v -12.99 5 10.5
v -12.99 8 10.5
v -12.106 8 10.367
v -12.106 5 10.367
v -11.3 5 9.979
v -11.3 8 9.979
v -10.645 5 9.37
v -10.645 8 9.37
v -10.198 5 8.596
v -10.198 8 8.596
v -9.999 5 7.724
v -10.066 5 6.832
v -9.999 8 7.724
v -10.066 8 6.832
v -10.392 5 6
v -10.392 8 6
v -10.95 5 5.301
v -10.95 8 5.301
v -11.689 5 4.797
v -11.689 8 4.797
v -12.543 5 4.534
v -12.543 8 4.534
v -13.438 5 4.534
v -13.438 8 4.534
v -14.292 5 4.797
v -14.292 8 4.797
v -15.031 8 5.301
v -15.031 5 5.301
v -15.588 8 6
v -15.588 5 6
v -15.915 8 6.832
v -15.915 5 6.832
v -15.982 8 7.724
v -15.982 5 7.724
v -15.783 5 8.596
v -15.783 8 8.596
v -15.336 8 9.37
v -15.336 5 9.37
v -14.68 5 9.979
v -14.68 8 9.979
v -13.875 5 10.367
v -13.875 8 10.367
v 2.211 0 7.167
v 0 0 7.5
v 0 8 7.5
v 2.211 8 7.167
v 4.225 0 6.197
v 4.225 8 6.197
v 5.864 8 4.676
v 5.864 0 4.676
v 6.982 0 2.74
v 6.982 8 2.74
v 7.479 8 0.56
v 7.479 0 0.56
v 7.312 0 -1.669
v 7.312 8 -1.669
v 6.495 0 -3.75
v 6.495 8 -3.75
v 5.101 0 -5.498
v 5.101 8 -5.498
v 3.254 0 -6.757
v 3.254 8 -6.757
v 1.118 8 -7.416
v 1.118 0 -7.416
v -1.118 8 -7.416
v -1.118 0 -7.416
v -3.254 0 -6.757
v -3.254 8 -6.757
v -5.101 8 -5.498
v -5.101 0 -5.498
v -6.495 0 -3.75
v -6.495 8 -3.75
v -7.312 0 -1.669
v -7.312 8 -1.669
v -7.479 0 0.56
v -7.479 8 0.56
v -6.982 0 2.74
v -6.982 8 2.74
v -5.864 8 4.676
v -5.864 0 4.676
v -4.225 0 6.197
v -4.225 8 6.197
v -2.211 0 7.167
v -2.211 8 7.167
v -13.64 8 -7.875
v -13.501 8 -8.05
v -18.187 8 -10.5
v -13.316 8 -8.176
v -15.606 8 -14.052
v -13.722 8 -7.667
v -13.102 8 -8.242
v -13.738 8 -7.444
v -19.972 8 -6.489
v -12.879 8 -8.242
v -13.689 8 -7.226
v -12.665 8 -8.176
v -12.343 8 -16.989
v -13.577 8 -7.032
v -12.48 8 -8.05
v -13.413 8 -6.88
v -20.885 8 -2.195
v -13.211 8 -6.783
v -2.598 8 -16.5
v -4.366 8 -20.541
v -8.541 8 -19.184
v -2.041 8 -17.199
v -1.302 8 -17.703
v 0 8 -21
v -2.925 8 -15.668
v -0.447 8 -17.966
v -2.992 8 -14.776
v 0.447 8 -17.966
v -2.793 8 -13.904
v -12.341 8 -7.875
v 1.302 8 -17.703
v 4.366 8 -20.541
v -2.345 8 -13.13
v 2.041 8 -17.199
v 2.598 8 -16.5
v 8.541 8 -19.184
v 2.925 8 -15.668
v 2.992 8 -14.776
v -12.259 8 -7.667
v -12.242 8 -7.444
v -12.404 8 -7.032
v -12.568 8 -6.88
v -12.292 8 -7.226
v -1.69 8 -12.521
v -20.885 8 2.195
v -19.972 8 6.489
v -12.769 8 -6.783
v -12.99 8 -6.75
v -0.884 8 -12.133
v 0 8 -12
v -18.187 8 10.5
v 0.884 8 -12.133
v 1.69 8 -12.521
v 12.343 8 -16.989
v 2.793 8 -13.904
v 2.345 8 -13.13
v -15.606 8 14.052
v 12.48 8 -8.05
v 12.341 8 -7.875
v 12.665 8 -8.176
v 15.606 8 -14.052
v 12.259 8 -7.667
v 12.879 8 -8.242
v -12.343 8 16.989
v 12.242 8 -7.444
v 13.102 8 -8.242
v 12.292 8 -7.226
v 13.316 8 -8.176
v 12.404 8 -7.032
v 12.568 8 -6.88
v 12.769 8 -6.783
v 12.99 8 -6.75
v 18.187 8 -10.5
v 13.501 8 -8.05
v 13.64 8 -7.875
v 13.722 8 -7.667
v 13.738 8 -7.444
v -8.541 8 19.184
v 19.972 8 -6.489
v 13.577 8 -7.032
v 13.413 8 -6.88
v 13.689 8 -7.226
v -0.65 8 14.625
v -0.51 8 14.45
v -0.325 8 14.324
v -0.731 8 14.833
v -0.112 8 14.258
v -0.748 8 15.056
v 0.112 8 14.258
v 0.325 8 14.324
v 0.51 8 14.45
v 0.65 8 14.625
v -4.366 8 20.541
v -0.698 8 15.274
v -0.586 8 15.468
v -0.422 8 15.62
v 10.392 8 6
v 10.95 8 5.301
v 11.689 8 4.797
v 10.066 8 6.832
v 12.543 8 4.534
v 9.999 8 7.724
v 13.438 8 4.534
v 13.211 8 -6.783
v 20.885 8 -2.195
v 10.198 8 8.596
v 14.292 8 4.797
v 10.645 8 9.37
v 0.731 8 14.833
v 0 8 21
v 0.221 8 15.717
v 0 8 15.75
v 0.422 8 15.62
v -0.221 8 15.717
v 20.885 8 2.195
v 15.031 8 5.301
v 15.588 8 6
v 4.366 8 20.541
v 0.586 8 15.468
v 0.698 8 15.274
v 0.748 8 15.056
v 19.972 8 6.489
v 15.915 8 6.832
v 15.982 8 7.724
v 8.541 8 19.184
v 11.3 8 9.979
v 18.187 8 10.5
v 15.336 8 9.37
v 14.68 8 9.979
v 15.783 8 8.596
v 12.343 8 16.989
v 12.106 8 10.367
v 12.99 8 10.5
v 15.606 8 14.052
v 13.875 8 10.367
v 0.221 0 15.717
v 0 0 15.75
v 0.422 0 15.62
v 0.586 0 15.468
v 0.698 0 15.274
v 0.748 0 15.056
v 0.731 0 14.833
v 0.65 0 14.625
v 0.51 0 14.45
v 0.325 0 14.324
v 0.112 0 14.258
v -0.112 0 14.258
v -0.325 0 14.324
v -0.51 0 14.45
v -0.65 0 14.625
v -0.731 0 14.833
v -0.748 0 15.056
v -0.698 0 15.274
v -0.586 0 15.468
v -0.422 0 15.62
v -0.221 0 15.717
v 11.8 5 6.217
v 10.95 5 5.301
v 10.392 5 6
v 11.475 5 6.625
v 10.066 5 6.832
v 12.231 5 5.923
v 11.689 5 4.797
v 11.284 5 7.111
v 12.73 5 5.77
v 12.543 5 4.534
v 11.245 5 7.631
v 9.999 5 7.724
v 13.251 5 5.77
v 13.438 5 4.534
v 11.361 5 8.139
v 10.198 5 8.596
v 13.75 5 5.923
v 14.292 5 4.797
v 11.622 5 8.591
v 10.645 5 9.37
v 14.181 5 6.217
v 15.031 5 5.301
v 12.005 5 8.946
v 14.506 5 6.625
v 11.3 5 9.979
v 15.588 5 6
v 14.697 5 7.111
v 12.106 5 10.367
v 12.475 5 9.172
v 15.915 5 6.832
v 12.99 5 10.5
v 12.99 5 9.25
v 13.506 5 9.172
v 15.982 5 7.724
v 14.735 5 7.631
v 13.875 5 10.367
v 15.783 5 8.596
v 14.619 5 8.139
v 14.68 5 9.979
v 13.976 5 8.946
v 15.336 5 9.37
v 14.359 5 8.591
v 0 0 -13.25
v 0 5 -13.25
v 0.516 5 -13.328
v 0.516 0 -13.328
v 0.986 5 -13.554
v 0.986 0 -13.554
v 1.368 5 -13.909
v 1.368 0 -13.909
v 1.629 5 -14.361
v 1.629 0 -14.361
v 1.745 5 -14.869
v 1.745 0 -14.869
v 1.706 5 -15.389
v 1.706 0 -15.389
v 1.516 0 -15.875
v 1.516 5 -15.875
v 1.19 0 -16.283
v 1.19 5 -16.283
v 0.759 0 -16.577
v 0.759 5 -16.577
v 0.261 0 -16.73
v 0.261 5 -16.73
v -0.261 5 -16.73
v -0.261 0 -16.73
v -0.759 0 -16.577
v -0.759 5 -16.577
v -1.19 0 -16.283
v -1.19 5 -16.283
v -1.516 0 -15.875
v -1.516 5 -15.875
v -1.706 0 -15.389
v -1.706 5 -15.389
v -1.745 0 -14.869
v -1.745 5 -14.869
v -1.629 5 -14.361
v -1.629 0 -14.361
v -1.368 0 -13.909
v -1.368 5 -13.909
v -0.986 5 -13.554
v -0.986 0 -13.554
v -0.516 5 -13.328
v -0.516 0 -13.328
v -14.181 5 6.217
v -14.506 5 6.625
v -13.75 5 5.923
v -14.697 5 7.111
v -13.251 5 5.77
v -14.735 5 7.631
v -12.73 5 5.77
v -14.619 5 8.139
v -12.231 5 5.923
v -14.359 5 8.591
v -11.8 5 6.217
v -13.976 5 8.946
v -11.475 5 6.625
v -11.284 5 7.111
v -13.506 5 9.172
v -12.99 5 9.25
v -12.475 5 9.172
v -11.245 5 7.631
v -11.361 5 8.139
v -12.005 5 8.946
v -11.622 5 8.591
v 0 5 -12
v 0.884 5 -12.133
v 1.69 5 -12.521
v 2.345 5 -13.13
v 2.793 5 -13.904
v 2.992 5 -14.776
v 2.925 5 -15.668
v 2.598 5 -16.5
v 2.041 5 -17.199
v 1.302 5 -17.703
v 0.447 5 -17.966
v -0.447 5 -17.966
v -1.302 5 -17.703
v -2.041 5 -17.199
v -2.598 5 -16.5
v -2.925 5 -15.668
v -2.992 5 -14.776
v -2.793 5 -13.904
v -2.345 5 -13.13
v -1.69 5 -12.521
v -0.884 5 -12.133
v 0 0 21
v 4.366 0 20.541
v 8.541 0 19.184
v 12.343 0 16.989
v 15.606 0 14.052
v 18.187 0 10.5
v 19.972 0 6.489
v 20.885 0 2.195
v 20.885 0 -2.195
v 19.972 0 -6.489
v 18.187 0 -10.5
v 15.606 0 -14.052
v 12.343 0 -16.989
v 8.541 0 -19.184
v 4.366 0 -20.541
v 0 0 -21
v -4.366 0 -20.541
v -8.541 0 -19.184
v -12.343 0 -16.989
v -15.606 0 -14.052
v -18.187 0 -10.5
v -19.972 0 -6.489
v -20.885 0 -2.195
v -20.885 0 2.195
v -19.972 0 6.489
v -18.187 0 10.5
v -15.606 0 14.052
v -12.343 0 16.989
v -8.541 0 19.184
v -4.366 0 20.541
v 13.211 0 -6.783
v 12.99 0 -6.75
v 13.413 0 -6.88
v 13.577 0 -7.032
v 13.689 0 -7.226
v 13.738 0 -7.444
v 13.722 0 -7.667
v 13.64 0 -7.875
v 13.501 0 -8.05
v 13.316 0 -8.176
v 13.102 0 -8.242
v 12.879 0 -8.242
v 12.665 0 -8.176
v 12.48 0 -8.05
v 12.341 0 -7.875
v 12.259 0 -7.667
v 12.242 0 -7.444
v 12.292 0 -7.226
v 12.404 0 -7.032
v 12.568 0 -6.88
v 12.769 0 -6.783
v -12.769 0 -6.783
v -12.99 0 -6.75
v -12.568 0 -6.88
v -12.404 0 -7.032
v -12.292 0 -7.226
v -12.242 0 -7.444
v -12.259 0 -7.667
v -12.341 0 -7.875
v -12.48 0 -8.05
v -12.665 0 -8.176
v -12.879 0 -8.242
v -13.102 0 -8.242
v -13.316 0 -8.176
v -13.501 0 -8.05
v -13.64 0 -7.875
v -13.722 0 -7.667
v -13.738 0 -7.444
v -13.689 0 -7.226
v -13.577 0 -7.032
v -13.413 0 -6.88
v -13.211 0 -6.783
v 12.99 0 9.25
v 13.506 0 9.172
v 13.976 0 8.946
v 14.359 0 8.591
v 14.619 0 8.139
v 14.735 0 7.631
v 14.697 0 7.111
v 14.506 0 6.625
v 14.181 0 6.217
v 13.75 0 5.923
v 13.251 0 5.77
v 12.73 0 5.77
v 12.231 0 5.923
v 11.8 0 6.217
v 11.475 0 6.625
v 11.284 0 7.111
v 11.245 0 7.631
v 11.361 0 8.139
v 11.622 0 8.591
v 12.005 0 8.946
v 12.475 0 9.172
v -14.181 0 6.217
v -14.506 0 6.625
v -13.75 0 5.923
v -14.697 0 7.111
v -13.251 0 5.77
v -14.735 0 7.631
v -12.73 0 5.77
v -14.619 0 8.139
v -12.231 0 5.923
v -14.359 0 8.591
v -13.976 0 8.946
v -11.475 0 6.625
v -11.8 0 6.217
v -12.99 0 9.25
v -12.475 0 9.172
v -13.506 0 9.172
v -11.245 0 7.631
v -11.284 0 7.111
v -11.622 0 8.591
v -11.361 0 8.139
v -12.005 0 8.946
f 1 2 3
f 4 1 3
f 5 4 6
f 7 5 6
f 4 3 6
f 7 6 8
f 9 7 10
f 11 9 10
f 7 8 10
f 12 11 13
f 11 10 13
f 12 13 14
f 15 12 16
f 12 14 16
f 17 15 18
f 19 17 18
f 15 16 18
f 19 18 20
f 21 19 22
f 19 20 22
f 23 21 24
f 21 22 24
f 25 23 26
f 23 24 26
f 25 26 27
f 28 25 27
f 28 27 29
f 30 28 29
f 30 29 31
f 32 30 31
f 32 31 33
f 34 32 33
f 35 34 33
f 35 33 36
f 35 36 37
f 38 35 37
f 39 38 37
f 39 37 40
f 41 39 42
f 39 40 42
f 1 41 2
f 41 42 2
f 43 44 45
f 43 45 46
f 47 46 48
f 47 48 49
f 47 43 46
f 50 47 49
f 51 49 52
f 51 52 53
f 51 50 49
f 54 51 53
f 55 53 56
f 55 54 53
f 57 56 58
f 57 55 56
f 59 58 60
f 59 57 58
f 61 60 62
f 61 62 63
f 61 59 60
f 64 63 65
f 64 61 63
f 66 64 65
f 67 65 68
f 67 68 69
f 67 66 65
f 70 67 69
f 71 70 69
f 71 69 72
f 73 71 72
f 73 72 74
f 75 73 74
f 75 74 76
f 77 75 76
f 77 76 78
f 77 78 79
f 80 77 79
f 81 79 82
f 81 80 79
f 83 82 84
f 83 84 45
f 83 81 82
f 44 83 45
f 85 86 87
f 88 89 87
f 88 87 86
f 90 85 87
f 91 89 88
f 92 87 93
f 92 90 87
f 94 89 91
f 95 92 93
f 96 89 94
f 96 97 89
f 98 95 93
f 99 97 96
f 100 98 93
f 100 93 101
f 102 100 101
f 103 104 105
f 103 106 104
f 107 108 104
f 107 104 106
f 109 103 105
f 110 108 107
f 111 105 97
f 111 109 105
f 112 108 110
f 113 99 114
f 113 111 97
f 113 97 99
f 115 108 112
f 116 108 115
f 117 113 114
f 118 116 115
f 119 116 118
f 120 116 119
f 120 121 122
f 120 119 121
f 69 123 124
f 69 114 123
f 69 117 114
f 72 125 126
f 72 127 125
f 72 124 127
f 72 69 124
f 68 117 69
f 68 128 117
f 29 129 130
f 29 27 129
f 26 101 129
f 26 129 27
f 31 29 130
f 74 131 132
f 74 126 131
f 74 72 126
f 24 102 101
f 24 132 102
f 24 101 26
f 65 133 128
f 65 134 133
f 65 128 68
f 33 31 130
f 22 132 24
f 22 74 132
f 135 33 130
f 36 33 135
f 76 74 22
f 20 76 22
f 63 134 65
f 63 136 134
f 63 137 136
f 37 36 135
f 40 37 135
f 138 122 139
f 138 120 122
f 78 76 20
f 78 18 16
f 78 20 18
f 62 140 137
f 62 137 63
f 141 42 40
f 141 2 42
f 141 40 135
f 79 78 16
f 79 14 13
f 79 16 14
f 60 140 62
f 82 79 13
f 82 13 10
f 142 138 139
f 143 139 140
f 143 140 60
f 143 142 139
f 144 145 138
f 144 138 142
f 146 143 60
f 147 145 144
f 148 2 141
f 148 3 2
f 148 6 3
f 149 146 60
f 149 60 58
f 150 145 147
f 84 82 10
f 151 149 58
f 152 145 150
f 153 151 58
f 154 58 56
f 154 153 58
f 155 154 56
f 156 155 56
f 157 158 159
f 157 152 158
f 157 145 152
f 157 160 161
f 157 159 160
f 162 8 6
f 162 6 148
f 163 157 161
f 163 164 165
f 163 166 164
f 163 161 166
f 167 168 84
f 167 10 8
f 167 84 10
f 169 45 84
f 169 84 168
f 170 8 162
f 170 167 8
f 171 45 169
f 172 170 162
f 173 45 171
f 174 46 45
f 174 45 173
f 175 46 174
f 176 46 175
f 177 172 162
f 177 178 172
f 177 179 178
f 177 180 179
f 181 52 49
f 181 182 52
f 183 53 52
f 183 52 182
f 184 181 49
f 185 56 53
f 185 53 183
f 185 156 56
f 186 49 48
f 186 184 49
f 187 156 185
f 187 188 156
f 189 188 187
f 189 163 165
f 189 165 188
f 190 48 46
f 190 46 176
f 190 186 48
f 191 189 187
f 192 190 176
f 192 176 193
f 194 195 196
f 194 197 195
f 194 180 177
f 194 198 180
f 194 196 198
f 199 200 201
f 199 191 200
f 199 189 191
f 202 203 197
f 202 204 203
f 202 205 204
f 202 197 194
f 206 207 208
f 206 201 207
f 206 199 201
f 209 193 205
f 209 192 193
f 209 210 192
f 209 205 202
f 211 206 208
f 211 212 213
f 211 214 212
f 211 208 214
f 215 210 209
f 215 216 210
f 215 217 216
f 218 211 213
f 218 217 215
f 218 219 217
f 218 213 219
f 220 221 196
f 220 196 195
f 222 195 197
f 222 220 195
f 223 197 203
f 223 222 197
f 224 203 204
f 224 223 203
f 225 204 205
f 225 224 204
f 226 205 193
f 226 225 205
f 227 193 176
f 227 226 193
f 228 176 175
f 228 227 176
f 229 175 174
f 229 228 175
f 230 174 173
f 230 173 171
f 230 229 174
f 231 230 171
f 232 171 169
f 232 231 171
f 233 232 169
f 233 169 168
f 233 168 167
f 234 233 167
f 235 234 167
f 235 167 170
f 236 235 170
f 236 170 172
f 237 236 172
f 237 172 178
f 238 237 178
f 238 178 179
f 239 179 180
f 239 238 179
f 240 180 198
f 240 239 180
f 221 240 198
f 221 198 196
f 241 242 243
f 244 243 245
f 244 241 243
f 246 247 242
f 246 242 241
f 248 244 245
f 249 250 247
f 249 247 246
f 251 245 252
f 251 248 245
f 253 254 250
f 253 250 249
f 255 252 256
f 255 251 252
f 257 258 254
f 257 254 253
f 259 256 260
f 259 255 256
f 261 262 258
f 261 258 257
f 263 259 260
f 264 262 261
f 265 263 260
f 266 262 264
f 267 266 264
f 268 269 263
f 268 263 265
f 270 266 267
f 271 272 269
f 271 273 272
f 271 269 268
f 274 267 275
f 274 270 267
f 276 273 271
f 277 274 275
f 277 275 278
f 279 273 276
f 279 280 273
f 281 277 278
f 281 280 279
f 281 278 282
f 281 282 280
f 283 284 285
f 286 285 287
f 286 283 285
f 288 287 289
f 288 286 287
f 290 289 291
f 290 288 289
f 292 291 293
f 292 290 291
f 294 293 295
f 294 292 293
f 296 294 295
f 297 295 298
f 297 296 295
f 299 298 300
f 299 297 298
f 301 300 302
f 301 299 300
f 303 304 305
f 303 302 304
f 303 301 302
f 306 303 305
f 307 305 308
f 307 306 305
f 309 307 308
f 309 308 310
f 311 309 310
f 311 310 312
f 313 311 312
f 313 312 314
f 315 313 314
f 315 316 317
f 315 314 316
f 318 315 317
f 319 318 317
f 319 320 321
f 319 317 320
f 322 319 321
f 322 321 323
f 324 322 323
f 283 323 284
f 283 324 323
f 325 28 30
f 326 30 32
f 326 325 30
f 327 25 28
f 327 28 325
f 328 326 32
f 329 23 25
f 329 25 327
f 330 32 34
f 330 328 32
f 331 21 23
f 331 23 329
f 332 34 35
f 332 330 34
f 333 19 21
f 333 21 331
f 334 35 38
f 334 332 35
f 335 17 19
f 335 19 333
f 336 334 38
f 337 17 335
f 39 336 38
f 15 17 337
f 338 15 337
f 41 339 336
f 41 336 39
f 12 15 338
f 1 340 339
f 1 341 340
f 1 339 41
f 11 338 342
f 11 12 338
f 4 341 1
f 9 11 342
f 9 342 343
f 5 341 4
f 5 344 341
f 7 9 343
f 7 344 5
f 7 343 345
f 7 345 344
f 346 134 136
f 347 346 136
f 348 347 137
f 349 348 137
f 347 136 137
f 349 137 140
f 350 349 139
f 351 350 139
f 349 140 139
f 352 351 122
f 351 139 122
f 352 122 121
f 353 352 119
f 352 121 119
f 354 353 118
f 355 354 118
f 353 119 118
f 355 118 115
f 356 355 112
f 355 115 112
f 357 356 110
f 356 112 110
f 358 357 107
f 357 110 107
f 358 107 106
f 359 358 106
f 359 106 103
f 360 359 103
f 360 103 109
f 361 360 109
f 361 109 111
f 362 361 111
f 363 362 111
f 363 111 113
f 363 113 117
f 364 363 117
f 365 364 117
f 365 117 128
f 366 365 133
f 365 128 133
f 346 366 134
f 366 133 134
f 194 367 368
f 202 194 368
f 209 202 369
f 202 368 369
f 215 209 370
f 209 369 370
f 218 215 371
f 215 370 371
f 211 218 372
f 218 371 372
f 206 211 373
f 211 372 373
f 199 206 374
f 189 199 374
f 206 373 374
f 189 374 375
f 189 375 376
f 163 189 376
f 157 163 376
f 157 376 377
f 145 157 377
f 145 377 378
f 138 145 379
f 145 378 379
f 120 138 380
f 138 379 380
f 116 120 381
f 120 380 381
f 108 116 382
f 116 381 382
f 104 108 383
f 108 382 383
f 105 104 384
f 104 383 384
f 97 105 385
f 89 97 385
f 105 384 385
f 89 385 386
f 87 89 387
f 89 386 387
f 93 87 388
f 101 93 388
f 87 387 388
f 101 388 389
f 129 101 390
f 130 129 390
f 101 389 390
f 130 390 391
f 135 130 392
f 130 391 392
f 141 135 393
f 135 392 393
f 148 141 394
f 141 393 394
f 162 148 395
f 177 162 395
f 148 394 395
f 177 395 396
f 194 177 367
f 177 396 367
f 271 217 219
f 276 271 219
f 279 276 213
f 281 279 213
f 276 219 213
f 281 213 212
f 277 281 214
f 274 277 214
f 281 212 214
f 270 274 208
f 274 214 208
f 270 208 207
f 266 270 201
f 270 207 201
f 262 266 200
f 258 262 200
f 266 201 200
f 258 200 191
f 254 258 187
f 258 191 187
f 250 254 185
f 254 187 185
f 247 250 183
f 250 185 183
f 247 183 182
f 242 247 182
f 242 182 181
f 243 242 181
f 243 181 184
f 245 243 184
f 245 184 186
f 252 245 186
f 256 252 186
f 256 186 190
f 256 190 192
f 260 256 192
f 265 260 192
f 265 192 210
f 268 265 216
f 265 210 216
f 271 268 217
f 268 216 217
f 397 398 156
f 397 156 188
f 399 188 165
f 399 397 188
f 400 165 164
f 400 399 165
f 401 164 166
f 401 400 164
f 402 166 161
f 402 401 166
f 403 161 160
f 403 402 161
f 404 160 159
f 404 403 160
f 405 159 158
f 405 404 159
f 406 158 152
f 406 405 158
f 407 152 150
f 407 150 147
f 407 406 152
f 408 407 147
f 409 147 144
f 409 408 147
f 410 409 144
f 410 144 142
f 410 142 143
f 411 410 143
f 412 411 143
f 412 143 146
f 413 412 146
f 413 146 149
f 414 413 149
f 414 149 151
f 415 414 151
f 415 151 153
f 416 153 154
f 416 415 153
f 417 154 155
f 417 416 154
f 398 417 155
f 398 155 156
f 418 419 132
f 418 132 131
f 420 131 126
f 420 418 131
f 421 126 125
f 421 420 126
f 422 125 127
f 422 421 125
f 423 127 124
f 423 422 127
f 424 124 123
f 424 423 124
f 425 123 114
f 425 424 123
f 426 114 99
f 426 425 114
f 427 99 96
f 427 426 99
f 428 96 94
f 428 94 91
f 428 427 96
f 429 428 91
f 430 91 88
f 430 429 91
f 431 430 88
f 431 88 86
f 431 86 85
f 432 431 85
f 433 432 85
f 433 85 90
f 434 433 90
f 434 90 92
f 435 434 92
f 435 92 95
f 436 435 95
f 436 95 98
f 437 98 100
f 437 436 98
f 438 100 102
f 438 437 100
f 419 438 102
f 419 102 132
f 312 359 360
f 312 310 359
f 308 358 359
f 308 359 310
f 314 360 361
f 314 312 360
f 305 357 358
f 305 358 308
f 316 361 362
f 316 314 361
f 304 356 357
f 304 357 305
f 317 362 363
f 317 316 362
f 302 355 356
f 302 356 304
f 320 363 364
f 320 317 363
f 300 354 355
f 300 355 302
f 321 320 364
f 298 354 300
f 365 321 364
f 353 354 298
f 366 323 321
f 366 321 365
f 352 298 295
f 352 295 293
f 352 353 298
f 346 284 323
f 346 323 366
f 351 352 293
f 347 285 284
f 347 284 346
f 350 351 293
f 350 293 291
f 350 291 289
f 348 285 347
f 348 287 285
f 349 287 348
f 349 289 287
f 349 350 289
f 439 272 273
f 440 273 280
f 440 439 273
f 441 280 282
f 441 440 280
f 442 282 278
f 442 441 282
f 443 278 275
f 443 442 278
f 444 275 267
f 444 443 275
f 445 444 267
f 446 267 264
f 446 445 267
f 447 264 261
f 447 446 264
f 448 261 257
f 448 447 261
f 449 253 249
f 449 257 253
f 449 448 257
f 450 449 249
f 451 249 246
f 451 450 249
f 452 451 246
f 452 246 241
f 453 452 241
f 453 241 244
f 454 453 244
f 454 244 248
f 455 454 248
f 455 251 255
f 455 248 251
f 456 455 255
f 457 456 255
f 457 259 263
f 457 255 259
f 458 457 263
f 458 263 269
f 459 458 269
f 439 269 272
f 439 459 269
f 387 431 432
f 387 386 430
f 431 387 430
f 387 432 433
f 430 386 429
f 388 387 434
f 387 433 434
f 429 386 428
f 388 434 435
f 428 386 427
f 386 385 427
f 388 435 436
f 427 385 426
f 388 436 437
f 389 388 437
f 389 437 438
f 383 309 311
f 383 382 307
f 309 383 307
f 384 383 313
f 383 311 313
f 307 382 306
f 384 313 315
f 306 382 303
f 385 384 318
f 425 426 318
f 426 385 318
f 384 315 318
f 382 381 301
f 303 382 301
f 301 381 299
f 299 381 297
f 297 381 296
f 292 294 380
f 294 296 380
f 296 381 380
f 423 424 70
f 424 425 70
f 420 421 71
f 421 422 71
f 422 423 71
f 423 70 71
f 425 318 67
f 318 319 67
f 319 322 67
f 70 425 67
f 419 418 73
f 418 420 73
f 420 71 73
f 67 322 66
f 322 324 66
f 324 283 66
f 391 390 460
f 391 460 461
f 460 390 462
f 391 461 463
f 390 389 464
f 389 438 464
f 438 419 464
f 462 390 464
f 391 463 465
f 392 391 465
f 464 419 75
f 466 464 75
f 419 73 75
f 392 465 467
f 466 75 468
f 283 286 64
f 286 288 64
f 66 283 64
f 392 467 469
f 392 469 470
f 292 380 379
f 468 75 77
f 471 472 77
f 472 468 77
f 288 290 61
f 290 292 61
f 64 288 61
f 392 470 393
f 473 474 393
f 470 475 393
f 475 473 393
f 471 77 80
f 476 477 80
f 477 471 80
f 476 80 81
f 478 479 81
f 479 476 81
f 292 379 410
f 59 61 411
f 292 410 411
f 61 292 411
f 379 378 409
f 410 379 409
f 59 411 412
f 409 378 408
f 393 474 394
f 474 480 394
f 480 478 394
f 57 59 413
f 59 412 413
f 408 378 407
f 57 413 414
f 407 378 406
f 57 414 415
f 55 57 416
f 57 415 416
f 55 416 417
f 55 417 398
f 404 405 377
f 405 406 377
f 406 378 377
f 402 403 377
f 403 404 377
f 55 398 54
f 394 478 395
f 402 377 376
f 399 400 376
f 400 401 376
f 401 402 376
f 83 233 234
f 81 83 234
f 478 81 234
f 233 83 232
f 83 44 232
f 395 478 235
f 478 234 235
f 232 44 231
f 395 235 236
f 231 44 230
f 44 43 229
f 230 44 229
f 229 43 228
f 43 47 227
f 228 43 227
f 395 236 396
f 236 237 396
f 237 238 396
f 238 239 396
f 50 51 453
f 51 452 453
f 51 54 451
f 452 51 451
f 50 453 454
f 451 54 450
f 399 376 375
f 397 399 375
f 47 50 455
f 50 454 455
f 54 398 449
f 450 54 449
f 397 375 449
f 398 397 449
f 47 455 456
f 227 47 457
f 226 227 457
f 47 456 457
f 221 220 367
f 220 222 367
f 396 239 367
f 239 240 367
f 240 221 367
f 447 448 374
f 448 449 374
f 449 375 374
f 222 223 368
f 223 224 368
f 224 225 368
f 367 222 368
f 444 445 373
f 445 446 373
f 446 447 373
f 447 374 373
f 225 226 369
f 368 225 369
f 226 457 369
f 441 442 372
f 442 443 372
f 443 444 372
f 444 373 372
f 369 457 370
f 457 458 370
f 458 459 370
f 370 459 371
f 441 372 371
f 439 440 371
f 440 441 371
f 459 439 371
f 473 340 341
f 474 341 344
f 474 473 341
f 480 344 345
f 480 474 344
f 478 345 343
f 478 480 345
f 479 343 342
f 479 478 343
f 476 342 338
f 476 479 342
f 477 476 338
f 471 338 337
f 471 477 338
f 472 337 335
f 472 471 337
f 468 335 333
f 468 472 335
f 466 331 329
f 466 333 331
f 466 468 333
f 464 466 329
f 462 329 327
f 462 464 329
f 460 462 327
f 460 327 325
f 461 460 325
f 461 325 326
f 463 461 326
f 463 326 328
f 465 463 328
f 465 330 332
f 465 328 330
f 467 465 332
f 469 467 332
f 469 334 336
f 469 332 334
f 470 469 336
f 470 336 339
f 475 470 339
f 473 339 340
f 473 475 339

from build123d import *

# Parameters (mm, degrees)
SKETCH1_R           = 21
SKETCH1_R_2         = 1.75
SKETCH1_R_3         = 0.75
SKETCH1_R_4         = 7.5
BOSS_EXTRUDE1_DEPTH = 8
SKETCH2_R           = 3
CUT_EXTRUDE1_DEPTH  = 3


with BuildPart() as part:
    # Sketch1 → Boss-Extrude1 (new body)
    with BuildSketch(Plane(origin=(0, 0, 0), x_dir=(1, 0, 0), z_dir=(0, 1, 0))):
        with Locations(Location((0, 0, 0), (0, 0, 270))):
            Circle(SKETCH1_R)
        with Locations(Location((0, 15, 0), (0, 0, 270))):
            Circle(SKETCH1_R_2, mode=Mode.SUBTRACT)
        with Locations(Location((0, -15, 0), (0, 0, 270))):
            Circle(SKETCH1_R_3, mode=Mode.SUBTRACT)
        with Locations(Location((12.990381057, -7.5, 0), (0, 0, 270))):
            Circle(SKETCH1_R_2, mode=Mode.SUBTRACT)
        with Locations(Location((-12.990381057, -7.5, 0), (0, 0, 270))):
            Circle(SKETCH1_R_2, mode=Mode.SUBTRACT)
        with Locations(Location((-12.990381057, 7.5, 0), (0, 0, 270))):
            Circle(SKETCH1_R_3, mode=Mode.SUBTRACT)
        with Locations(Location((12.990381057, 7.5, 0), (0, 0, 270))):
            Circle(SKETCH1_R_3, mode=Mode.SUBTRACT)
        with Locations(Location((0, 0, 0), (0, 0, 270))):
            Circle(SKETCH1_R_4, mode=Mode.SUBTRACT)
    extrude(amount=BOSS_EXTRUDE1_DEPTH)

    # Sketch2 → Cut-Extrude1 (cut)
    with BuildSketch(Plane(origin=(0, 8, 0), x_dir=(1, 0, 0), z_dir=(0, 1, 0))):
        with Locations(Location((0, 15, 0), (0, 0, 270))):
            Circle(SKETCH2_R)
        with Locations(Location((12.990381057, -7.5, 0), (0, 0, 270))):
            Circle(SKETCH2_R)
        with Locations(Location((-12.990381057, -7.5, 0), (0, 0, 270))):
            Circle(SKETCH2_R)
    extrude(amount=-CUT_EXTRUDE1_DEPTH, mode=Mode.SUBTRACT)


solid = part.part
